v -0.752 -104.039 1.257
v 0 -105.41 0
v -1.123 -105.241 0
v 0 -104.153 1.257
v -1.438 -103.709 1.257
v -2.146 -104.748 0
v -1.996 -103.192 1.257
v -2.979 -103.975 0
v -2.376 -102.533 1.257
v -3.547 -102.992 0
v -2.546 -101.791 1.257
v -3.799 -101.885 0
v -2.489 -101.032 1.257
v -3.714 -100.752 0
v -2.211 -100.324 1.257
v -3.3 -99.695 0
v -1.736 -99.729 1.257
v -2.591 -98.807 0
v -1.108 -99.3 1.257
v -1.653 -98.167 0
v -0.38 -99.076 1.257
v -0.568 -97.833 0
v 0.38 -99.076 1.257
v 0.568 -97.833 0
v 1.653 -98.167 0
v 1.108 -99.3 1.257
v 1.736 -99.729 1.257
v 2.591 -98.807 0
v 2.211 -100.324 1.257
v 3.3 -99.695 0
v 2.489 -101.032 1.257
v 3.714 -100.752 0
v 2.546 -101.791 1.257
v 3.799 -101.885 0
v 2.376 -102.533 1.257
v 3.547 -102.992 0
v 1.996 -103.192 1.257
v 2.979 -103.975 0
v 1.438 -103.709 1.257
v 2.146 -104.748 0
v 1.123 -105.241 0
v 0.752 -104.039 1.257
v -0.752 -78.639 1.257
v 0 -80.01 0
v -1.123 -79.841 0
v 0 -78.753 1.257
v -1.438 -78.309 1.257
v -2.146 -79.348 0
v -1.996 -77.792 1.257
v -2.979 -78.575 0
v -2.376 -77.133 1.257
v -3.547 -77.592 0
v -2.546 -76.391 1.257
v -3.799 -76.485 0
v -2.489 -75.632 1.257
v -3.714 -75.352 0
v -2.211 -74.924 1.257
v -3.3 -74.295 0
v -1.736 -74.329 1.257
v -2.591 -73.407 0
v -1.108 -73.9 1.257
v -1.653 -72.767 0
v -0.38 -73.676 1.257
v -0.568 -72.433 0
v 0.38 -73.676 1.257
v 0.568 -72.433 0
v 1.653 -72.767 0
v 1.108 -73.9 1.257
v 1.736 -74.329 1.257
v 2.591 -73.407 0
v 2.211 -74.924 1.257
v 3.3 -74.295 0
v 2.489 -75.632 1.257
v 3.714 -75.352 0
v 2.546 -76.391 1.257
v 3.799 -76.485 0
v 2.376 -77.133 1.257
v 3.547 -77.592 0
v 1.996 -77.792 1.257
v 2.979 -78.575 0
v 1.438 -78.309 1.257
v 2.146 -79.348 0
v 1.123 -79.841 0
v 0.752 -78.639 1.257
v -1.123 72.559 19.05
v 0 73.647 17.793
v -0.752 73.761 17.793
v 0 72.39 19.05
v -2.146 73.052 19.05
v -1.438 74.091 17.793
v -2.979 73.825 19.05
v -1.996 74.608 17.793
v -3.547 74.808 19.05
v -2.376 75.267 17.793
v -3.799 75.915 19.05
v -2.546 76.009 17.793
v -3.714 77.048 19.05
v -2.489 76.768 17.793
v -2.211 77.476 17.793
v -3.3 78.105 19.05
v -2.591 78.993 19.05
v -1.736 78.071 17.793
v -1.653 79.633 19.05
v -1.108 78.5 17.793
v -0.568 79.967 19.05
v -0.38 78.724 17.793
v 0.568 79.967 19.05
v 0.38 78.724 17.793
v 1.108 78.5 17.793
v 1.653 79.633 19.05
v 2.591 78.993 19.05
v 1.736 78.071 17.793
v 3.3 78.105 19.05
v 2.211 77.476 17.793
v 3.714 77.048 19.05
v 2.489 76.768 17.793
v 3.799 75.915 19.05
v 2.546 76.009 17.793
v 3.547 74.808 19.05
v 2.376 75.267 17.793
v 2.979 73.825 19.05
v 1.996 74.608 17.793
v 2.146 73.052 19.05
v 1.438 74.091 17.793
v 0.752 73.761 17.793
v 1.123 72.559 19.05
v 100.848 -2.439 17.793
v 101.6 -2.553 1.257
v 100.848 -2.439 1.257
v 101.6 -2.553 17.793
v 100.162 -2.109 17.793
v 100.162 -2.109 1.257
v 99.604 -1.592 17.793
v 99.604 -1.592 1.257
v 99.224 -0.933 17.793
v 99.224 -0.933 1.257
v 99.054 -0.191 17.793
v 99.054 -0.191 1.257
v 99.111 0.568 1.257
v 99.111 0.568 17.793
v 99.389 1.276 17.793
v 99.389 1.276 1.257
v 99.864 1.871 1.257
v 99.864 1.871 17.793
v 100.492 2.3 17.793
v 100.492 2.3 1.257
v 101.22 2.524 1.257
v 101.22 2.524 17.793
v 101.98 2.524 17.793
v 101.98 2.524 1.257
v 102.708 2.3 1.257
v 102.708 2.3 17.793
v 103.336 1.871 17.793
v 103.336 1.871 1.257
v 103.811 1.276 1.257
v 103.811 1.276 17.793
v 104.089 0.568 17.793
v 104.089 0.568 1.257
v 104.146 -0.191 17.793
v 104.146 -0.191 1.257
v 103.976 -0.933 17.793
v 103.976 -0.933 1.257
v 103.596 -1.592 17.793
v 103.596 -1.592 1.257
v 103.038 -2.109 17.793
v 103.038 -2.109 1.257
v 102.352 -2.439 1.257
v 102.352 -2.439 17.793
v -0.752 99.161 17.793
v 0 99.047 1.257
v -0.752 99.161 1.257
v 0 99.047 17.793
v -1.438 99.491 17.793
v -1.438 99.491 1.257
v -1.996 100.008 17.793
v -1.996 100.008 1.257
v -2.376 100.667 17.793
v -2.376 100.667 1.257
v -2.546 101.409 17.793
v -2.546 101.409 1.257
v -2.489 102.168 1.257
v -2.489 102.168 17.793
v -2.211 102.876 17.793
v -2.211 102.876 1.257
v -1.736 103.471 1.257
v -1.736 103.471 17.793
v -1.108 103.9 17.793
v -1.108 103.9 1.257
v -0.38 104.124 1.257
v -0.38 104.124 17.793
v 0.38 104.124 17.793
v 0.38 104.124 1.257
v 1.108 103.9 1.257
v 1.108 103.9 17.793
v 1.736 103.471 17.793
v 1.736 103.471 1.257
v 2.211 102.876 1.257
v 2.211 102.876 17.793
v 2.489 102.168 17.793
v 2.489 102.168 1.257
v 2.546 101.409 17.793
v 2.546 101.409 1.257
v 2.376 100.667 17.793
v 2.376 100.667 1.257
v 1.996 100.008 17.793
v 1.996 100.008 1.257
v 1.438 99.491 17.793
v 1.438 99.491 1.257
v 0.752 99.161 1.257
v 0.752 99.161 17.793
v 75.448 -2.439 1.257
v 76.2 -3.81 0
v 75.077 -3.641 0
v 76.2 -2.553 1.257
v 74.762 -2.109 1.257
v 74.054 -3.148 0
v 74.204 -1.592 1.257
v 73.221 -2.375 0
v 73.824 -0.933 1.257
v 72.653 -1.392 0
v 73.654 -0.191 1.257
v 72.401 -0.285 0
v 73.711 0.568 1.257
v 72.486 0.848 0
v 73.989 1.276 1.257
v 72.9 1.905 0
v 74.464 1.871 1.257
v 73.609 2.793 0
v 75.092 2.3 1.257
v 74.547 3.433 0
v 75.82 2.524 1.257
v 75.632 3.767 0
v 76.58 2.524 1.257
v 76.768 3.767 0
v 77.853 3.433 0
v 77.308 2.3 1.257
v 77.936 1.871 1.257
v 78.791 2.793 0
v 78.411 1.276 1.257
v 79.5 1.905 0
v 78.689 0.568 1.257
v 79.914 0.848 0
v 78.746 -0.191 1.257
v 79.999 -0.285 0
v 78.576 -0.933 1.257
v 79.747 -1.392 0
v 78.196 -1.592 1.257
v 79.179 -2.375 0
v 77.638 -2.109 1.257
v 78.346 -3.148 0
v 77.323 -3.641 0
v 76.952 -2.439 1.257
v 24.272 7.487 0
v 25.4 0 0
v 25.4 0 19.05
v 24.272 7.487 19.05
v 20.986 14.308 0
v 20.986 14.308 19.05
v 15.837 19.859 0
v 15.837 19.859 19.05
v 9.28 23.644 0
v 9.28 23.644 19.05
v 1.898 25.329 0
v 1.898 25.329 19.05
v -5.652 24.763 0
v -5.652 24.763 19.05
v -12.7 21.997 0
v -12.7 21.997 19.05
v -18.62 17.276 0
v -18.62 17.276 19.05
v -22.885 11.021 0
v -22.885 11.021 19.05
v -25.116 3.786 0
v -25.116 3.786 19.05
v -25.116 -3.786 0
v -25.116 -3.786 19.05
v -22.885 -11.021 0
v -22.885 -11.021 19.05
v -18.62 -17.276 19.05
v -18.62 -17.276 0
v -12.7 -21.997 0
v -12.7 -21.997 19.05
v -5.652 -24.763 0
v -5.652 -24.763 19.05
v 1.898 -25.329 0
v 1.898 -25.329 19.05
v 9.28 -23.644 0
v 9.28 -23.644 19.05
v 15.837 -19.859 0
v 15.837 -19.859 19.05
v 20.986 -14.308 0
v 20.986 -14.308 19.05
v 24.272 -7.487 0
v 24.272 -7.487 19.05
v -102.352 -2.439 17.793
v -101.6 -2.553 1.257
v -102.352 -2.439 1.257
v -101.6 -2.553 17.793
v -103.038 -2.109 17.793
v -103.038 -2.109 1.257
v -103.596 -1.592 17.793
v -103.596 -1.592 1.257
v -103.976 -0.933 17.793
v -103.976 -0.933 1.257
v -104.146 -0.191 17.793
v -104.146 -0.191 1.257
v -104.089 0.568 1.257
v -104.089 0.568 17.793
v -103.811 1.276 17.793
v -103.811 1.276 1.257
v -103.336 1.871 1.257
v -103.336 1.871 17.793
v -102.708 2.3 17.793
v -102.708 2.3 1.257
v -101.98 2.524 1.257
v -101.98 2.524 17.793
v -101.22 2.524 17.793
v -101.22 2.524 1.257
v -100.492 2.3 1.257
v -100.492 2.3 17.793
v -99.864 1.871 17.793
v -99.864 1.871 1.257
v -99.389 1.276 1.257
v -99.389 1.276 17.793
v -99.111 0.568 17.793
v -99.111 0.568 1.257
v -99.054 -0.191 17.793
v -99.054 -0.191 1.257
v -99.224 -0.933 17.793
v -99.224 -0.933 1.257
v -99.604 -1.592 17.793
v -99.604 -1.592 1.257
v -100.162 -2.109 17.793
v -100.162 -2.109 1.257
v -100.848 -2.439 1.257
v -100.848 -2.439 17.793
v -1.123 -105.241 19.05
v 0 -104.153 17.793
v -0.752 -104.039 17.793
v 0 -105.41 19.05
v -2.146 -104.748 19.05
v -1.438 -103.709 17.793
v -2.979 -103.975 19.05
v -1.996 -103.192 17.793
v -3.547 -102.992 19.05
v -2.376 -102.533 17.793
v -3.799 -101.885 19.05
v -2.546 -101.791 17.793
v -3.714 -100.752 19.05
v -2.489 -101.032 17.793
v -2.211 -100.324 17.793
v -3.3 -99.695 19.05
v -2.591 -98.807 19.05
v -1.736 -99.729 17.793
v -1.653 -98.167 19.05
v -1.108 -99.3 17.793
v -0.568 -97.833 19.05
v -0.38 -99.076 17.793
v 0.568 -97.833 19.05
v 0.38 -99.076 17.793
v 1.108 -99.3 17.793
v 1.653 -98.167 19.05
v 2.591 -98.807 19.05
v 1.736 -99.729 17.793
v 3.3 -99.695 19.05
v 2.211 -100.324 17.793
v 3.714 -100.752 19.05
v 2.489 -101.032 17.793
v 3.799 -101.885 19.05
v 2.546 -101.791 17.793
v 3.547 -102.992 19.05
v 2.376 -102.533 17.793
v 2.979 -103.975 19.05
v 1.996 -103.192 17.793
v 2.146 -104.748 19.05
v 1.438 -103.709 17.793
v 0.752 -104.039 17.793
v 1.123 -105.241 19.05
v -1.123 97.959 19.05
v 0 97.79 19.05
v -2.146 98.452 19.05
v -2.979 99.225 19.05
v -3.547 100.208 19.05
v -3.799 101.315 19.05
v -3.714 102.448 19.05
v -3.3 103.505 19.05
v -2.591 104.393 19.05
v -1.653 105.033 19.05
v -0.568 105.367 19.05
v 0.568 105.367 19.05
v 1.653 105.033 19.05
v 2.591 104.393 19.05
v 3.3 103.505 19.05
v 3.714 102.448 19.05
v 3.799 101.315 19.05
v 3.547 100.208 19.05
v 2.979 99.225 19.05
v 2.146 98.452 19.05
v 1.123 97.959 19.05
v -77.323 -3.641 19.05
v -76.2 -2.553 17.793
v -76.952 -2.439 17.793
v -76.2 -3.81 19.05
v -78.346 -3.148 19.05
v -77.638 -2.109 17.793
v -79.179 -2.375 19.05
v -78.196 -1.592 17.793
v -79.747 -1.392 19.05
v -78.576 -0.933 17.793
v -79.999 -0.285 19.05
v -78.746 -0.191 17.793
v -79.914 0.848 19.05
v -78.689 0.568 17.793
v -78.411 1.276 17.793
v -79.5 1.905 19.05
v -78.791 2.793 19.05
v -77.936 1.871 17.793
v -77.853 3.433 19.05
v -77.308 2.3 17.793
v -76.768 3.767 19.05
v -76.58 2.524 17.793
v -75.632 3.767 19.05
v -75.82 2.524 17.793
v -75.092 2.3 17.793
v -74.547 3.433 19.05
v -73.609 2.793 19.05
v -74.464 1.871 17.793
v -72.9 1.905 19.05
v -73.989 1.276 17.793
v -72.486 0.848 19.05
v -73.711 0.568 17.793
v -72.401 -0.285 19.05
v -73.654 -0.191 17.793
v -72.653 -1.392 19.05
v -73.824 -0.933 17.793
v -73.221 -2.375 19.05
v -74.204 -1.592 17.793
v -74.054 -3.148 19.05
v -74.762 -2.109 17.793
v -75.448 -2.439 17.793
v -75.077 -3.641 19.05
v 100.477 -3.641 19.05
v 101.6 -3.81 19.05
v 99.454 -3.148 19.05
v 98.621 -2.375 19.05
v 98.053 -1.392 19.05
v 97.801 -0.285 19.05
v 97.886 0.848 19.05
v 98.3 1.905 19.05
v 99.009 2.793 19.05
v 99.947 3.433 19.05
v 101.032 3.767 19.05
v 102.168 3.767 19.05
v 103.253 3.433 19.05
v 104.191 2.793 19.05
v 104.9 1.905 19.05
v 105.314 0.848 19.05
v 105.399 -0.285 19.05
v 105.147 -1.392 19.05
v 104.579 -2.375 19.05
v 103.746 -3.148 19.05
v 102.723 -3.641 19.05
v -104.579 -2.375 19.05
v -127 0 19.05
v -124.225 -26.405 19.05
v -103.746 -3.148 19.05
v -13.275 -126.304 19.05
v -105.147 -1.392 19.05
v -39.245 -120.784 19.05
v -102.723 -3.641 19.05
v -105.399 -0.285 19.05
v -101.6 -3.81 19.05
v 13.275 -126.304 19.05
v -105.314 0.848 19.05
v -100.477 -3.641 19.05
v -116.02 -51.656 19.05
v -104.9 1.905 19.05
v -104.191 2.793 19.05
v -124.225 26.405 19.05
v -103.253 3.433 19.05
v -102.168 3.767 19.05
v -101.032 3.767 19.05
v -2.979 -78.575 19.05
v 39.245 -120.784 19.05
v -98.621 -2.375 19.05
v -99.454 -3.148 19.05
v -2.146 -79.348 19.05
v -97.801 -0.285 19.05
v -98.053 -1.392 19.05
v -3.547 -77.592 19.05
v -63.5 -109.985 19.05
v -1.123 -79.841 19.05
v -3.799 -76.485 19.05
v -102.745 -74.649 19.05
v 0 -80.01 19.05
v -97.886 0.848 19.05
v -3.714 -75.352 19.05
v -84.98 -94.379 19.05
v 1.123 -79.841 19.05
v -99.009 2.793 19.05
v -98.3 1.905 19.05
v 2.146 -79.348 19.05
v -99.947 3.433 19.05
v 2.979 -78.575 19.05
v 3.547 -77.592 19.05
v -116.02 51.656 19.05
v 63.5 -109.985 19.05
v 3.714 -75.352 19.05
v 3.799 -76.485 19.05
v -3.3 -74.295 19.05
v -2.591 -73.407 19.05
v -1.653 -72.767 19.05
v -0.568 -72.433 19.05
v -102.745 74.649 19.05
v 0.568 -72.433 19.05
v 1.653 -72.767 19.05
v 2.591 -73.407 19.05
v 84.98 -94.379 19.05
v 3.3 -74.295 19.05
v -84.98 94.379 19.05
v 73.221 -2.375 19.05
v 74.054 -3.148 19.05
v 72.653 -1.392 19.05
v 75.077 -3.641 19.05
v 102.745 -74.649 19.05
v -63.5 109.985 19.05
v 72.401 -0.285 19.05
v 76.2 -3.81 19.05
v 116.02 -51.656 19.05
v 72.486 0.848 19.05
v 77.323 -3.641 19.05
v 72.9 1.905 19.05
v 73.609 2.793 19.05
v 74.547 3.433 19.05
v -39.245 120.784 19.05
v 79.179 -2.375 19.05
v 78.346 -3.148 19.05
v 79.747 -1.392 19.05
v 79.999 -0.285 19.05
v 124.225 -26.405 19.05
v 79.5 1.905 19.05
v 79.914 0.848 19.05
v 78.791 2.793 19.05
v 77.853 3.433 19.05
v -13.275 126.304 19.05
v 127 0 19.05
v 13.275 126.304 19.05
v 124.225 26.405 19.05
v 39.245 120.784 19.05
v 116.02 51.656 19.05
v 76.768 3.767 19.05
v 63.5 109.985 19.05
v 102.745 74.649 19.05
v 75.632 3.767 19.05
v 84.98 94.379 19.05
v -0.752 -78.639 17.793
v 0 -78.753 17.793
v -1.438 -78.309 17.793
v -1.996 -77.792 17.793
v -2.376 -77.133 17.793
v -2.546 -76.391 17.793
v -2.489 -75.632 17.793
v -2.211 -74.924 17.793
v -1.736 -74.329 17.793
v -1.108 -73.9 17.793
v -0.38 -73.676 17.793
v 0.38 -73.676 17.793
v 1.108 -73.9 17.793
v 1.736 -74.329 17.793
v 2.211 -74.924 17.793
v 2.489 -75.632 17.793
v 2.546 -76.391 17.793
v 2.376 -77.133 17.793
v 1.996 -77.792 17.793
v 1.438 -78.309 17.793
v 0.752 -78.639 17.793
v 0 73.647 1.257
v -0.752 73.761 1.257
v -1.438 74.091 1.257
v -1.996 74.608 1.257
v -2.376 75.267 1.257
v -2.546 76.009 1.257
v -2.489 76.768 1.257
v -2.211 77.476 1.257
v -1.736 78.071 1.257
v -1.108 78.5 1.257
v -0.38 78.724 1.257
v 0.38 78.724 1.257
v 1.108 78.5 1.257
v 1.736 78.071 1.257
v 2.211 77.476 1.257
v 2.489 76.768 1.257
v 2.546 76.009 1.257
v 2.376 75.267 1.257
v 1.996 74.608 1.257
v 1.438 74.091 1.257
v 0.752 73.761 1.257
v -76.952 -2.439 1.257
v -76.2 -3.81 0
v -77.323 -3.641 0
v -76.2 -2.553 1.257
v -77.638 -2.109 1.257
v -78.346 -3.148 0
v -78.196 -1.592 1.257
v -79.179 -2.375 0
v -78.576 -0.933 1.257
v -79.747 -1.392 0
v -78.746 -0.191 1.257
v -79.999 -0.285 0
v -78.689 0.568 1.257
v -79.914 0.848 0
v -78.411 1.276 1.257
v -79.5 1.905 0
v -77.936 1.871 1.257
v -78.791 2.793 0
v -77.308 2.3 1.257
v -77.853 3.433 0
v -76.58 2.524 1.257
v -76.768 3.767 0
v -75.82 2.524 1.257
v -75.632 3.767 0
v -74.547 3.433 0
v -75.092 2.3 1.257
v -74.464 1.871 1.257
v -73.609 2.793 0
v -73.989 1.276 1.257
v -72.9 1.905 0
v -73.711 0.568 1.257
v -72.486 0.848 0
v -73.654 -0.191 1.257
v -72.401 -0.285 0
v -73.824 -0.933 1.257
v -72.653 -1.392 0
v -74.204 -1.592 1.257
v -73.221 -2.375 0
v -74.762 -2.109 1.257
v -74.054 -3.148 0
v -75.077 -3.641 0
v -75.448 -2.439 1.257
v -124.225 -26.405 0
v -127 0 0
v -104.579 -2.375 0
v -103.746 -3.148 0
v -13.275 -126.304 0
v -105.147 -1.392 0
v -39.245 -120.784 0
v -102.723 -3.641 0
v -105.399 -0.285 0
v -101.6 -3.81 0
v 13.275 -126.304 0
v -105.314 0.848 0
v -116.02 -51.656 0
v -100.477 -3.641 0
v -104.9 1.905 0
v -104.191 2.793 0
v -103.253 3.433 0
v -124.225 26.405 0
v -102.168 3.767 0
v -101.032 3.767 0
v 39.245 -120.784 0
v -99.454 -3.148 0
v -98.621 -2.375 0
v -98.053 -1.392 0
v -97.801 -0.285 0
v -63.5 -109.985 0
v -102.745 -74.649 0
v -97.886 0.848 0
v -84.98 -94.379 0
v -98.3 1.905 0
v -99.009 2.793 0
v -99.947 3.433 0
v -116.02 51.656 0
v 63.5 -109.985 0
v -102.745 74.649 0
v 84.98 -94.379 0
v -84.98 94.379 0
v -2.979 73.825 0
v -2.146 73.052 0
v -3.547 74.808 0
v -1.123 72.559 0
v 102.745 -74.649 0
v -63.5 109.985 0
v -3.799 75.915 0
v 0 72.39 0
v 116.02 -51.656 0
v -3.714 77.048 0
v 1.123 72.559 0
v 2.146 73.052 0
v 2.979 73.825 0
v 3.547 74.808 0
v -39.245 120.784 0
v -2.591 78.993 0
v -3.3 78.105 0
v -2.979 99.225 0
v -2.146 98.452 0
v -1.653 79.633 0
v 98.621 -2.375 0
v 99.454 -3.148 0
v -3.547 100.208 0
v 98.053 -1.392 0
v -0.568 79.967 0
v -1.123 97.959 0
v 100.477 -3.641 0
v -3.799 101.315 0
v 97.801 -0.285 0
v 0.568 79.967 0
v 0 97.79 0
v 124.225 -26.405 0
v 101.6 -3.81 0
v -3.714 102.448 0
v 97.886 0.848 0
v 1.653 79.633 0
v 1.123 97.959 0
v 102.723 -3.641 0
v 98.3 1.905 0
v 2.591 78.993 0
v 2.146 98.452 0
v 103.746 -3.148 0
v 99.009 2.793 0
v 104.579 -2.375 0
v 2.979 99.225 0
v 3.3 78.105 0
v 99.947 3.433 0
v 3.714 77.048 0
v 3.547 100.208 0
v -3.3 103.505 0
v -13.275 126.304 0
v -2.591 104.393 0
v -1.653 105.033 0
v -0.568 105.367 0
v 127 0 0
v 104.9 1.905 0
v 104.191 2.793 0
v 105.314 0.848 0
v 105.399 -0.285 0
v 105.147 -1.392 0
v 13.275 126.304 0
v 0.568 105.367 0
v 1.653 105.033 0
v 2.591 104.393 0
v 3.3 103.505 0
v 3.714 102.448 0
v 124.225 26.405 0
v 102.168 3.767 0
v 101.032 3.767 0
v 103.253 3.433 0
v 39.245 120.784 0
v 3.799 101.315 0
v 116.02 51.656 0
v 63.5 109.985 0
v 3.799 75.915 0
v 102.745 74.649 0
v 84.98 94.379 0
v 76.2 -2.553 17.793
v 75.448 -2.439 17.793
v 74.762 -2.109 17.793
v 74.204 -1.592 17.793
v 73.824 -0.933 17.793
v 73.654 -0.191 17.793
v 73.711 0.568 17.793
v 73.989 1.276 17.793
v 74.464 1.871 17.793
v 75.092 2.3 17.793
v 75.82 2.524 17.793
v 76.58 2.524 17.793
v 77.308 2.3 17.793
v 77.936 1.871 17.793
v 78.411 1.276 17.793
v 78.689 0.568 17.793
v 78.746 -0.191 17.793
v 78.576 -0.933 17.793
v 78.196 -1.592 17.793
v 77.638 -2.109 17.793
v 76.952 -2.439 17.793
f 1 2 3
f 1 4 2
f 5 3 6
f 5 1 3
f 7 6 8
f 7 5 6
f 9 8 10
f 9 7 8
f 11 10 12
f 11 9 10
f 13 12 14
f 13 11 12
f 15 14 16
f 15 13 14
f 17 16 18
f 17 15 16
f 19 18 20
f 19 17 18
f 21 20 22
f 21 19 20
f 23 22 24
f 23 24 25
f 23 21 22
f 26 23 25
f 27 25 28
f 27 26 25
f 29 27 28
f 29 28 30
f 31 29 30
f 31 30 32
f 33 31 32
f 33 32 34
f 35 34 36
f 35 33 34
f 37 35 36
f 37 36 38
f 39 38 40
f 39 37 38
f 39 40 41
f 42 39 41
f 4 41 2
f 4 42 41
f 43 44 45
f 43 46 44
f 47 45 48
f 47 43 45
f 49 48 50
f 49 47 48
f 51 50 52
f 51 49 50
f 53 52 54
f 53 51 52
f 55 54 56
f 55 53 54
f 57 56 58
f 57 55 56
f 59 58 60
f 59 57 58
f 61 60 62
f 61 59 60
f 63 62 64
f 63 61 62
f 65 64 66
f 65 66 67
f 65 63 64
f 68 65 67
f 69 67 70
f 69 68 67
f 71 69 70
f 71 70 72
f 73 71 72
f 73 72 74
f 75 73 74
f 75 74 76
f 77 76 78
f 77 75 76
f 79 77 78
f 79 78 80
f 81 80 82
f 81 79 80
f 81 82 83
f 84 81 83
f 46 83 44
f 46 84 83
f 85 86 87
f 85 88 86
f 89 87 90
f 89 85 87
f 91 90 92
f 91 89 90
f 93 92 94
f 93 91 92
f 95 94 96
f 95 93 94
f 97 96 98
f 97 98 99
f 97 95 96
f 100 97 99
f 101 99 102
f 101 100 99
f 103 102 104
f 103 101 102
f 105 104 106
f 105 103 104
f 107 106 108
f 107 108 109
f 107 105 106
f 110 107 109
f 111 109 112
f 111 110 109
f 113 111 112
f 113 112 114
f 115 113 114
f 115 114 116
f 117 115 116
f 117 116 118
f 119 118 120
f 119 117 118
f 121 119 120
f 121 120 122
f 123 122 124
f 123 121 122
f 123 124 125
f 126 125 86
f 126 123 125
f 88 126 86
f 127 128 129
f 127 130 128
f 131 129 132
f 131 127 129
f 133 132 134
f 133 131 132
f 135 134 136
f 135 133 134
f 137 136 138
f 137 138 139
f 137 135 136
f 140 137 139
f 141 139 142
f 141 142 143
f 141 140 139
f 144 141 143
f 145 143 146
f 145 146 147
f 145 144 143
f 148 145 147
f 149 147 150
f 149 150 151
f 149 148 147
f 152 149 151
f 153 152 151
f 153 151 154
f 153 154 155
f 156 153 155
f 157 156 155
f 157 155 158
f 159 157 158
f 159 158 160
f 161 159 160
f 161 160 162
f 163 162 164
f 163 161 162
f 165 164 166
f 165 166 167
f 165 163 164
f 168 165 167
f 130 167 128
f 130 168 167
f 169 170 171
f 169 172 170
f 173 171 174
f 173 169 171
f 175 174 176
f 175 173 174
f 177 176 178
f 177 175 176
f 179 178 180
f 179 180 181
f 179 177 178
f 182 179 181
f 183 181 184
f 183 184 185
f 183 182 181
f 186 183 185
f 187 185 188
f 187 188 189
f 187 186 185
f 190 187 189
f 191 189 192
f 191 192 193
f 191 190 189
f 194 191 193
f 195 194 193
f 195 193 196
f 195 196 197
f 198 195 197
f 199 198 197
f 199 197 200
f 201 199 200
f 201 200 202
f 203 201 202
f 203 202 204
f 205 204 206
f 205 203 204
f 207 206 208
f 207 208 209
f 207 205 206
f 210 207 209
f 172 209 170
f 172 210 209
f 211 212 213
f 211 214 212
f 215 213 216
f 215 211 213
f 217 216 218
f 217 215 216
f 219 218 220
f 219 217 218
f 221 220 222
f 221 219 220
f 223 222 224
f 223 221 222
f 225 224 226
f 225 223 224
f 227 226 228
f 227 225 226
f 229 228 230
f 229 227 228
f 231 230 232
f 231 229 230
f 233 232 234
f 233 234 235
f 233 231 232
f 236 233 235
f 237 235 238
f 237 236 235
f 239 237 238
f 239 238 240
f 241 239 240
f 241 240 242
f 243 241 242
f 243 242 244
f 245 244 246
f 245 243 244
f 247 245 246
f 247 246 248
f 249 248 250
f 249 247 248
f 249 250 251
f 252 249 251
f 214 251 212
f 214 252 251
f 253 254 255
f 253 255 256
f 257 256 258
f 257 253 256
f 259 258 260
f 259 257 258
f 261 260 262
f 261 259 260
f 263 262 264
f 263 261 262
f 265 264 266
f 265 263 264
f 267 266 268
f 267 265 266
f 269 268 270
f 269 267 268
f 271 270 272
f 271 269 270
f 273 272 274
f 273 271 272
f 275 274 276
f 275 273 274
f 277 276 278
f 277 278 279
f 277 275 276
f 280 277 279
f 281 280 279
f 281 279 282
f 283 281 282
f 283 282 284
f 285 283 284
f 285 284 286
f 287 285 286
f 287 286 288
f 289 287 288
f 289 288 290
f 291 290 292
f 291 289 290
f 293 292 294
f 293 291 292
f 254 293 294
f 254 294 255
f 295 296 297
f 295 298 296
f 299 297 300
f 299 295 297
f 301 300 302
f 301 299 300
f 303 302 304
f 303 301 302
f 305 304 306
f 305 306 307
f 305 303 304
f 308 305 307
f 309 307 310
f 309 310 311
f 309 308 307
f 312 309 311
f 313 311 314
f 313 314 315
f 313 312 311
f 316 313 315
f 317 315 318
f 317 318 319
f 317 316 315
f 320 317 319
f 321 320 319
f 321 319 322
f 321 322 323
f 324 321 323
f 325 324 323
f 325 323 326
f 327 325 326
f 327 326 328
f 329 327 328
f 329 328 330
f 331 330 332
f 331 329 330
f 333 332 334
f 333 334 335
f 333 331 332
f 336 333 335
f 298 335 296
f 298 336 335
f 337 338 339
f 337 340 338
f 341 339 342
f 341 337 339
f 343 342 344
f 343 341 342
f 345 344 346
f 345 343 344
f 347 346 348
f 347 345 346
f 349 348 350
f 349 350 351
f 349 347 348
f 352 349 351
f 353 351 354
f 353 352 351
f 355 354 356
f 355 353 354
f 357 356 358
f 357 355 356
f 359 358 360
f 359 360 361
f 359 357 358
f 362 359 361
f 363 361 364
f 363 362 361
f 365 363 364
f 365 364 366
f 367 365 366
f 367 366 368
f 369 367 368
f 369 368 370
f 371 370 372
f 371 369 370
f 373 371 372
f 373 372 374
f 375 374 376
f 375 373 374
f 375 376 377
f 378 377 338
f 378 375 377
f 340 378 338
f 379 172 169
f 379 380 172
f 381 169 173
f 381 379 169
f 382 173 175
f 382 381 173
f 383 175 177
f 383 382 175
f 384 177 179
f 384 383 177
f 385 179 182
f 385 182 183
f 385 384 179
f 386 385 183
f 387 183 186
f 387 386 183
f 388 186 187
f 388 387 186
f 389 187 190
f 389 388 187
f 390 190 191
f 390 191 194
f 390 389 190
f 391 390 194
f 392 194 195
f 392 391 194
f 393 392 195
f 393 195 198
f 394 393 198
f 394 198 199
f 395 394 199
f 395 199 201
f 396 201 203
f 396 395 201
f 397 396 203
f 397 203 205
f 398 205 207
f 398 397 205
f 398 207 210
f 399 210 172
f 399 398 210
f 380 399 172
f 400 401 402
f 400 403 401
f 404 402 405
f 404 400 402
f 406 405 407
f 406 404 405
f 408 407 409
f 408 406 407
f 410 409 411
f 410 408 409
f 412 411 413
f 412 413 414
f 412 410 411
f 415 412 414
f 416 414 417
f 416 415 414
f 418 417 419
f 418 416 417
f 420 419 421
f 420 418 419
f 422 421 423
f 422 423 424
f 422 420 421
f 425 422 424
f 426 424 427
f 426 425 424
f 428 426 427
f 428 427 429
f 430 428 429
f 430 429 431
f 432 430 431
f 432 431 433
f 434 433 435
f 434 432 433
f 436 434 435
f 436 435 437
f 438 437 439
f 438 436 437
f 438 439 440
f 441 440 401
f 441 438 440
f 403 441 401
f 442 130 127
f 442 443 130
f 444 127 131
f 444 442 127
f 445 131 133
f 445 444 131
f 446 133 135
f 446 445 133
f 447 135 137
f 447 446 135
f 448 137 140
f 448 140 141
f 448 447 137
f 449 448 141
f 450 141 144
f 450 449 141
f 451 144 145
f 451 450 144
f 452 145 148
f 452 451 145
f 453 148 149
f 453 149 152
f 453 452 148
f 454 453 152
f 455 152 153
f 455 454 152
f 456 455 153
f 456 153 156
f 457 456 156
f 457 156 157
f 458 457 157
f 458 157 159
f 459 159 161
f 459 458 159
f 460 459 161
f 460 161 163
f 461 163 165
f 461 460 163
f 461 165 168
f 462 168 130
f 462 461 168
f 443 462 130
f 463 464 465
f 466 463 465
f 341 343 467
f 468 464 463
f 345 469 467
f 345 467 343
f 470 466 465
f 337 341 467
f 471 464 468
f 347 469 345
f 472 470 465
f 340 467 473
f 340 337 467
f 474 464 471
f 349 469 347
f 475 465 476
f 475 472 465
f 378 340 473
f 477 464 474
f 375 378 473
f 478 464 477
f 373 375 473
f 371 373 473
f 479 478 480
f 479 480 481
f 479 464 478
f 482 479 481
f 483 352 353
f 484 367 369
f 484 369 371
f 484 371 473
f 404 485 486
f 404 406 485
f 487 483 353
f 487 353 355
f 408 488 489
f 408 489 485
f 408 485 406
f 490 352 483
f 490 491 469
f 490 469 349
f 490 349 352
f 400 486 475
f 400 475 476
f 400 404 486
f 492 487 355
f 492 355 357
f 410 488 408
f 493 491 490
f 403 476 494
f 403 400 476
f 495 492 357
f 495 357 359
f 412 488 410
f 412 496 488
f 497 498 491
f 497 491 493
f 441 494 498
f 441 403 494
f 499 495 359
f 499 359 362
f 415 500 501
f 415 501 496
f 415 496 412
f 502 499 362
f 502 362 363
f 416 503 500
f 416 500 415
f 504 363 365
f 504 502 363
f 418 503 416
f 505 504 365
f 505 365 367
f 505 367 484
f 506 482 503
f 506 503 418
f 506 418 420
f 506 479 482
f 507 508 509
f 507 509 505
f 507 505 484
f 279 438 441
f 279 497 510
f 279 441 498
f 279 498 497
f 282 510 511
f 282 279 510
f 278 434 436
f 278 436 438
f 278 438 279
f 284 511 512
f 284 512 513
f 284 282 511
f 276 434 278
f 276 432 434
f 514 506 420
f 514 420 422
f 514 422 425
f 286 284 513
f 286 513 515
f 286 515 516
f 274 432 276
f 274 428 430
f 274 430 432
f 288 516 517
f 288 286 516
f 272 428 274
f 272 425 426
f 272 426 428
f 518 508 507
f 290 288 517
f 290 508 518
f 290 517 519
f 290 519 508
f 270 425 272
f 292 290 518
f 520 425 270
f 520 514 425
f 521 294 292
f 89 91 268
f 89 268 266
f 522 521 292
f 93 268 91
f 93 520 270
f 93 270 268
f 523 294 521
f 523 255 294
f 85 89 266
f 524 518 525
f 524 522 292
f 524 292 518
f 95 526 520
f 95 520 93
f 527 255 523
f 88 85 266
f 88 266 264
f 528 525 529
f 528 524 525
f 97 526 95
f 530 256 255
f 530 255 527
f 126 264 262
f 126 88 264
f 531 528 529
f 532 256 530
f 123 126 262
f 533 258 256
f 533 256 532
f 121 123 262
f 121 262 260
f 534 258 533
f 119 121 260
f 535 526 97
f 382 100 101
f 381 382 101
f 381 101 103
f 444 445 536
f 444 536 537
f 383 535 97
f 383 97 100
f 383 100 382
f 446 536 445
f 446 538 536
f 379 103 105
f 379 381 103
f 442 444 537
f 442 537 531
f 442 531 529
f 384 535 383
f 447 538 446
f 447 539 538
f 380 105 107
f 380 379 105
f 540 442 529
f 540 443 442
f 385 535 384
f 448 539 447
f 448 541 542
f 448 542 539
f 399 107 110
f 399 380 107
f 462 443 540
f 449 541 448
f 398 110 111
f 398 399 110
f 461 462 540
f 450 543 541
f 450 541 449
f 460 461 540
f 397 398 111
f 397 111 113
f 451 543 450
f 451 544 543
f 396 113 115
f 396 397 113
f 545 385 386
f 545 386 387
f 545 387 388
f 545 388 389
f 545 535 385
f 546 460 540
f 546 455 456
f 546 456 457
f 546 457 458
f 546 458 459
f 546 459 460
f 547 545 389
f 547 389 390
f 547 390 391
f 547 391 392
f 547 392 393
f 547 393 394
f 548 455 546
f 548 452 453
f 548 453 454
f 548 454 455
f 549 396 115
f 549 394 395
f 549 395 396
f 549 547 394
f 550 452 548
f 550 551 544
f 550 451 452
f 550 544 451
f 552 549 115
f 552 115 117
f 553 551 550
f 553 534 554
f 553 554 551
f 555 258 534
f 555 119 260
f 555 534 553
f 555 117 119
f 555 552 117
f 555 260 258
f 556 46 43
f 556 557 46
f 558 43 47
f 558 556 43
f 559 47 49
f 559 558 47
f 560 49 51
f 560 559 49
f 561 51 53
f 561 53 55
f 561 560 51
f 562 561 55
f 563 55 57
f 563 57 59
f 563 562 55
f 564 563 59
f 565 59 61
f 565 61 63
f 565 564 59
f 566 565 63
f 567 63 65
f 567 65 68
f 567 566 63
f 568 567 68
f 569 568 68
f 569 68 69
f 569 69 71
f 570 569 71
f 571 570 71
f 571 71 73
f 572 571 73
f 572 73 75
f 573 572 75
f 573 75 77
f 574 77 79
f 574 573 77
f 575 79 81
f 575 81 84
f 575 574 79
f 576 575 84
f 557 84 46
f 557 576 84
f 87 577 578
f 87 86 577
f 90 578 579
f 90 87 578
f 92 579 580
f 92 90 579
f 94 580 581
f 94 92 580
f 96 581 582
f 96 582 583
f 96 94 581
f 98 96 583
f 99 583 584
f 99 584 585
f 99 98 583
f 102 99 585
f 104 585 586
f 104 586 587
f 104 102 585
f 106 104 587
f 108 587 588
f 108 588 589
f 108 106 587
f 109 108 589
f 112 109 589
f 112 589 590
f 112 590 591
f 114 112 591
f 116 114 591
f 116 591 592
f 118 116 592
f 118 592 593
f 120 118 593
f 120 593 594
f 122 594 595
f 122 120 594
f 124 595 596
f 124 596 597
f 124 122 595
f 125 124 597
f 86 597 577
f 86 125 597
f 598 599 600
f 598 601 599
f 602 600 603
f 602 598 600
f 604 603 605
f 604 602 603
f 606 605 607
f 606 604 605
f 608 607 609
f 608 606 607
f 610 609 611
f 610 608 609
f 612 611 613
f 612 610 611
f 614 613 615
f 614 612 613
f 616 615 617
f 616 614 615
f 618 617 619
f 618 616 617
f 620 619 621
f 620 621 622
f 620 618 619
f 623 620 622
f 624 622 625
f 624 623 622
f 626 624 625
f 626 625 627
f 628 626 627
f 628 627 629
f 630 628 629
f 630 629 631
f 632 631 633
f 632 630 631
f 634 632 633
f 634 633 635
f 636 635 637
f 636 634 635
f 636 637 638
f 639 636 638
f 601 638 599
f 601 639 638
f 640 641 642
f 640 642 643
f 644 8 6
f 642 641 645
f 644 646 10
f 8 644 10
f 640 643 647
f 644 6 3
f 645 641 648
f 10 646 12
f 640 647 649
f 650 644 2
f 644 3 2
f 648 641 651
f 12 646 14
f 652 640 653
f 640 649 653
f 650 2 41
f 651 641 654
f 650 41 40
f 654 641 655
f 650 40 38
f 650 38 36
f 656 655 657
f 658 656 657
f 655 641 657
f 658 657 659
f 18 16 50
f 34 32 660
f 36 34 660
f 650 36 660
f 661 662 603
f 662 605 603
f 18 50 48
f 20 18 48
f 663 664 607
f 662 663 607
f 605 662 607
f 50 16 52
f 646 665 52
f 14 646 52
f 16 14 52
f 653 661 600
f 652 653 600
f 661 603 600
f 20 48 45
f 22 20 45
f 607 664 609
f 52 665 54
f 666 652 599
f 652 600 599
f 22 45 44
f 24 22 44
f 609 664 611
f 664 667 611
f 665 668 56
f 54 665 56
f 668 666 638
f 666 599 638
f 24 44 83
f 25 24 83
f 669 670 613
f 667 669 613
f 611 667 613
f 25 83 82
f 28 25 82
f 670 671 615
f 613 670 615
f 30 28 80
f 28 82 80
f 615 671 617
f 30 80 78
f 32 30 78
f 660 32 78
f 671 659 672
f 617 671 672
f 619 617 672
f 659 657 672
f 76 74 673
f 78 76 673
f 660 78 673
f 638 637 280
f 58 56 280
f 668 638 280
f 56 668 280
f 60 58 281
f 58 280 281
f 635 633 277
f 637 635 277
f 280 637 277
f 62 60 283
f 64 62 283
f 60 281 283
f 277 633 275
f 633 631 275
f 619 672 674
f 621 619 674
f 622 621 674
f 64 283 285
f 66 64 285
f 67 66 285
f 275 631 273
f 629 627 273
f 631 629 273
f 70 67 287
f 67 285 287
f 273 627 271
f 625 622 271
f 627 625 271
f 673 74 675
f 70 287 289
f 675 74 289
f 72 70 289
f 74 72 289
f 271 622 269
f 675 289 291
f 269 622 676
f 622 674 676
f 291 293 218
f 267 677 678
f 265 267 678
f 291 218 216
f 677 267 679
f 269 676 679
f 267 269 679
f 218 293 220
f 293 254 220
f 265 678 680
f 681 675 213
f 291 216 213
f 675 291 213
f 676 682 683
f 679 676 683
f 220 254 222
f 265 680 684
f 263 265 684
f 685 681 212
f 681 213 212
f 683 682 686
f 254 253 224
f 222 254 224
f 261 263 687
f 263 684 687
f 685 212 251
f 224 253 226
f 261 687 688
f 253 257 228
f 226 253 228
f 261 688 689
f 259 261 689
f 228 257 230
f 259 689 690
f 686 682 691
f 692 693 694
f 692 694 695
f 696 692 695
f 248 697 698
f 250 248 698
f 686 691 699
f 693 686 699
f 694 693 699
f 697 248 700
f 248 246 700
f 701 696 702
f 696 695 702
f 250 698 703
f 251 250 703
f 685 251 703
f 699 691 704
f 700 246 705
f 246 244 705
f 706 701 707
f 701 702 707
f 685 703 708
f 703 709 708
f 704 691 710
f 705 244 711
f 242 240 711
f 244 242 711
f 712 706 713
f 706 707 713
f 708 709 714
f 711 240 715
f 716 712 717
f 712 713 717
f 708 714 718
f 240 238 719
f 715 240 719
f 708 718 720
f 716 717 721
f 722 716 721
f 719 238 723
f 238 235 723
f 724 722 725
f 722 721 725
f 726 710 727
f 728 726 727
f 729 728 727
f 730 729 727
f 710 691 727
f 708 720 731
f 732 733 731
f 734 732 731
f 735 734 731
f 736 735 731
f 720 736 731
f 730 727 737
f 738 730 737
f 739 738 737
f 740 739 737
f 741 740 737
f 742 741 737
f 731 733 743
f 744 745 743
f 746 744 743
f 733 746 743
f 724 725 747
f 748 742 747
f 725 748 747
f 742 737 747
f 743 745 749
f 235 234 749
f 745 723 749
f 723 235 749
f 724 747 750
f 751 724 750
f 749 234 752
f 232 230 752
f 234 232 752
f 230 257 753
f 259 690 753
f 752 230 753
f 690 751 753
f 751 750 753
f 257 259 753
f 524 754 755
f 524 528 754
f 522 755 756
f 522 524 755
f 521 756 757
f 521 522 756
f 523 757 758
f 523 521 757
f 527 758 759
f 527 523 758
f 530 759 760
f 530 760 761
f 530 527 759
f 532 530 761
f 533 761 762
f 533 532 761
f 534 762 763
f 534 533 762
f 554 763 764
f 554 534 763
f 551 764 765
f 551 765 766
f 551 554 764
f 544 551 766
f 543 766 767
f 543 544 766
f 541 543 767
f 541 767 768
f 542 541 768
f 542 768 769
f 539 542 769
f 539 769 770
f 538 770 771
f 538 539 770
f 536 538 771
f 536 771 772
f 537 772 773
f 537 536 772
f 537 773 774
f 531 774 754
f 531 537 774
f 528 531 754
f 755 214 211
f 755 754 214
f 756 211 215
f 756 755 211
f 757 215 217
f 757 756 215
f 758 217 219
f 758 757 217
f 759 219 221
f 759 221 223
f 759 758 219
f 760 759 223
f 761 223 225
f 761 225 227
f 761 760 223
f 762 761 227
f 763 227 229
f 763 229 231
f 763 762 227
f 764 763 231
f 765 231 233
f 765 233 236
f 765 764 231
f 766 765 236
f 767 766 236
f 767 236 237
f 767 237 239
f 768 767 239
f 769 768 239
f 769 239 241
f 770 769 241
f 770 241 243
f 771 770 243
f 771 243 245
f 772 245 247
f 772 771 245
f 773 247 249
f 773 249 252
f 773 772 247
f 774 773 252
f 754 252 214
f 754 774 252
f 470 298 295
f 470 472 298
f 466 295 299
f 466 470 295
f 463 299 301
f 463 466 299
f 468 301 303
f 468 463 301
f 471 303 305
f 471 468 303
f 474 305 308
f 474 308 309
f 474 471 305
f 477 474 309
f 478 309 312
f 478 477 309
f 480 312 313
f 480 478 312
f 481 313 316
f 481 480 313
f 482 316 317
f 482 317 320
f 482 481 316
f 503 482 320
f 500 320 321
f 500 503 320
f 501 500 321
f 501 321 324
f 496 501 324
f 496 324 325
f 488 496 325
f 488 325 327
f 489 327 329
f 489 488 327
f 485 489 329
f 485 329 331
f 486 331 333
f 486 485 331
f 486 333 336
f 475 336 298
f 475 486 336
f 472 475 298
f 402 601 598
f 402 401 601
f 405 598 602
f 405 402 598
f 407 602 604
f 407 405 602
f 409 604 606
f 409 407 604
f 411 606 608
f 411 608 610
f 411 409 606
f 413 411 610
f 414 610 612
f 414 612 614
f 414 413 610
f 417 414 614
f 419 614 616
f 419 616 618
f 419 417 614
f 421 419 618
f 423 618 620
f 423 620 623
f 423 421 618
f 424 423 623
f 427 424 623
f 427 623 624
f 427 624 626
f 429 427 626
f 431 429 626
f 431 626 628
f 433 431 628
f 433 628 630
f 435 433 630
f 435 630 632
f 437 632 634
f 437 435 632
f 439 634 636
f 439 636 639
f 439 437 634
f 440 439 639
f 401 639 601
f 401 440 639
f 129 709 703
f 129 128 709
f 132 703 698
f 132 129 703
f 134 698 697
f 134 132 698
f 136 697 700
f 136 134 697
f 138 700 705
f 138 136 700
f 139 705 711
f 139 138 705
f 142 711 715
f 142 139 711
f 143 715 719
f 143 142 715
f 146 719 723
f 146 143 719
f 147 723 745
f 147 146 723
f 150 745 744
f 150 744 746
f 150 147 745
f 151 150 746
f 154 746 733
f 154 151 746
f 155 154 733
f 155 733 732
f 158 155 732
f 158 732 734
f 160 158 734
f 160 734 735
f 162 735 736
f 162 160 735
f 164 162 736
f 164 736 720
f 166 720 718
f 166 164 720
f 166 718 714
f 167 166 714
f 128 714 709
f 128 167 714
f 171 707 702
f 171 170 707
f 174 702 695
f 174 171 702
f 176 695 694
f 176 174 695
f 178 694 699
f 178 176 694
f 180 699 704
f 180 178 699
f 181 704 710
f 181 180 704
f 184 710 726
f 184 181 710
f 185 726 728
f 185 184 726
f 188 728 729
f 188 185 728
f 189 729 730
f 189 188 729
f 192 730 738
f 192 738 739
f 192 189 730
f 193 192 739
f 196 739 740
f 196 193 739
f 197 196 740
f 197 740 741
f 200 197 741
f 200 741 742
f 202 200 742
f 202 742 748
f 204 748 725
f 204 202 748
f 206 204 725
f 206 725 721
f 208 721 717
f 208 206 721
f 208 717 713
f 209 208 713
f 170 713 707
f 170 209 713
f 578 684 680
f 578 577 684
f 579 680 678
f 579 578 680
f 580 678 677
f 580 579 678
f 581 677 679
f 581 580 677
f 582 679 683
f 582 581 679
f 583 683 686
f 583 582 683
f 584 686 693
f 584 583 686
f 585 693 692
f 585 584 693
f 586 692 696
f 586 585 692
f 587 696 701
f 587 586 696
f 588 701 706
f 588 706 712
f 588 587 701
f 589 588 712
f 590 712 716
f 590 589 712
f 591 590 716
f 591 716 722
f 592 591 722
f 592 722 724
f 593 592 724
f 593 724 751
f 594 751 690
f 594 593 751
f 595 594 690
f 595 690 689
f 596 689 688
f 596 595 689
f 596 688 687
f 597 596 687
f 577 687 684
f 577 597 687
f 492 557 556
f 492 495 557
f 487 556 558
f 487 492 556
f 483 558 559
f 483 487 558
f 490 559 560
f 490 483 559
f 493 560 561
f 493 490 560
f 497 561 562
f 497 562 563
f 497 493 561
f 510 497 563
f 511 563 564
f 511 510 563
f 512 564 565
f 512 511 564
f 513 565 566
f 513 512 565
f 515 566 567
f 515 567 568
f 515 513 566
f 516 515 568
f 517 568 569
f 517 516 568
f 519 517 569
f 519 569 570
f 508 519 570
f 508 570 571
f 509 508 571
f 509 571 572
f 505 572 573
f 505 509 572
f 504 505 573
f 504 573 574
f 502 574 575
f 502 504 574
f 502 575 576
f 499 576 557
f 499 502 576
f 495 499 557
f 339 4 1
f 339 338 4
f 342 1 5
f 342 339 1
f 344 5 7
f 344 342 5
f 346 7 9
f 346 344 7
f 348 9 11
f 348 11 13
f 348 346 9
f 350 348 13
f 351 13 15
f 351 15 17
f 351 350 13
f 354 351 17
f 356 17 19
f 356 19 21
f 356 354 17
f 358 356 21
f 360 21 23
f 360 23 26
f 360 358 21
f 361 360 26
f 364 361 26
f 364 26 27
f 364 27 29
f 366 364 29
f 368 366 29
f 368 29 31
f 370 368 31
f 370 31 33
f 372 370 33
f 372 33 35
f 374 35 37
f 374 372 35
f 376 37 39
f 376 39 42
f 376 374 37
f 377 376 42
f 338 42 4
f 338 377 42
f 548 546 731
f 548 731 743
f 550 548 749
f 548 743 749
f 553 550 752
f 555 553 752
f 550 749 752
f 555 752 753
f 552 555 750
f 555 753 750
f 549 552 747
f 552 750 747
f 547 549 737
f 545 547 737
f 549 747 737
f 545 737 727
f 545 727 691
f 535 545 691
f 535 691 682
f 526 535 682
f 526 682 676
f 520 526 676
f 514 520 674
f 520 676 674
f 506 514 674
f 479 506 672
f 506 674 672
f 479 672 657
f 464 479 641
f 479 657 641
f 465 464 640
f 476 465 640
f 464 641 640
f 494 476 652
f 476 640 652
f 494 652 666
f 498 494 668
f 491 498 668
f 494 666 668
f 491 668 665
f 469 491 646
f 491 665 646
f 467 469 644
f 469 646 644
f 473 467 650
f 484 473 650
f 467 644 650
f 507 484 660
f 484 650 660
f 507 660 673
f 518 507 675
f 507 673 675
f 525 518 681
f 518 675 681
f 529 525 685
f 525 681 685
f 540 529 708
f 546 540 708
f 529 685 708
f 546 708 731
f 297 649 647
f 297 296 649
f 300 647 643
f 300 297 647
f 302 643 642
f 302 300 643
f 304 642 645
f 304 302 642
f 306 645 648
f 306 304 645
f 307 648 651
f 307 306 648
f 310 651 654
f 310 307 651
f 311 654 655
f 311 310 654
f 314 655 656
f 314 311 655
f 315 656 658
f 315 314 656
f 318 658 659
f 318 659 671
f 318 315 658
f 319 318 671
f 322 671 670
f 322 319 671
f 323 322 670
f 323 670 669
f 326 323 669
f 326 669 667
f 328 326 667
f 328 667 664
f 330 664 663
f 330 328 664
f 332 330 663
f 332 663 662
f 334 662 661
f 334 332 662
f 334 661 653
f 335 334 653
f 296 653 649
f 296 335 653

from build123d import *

# Parameters (mm, degrees)
SKETCH1_R                        = 127
SKETCH1_R_2                      = 25.4
BOSS_EXTRUDE2_DEPTH              = 19.05
F_1_4_20_TAPPED_HOLE1_AT_2_COUNT = 2
F_1_4_20_TAPPED_HOLE1_AT_2_PITCH = 127
F_1_4_20_TAPPED_HOLE1_AT_3_COUNT = 2
F_1_4_20_TAPPED_HOLE1_AT_3_PITCH = 107.763073453
F_1_4_20_TAPPED_HOLE1_AT_4_COUNT = 2
F_1_4_20_TAPPED_HOLE1_AT_4_PITCH = 177.8
F_1_4_20_TAPPED_HOLE1_AT_5_COUNT = 2
F_1_4_20_TAPPED_HOLE1_AT_5_PITCH = 152.4
F_1_4_20_TAPPED_HOLE1_AT_6_COUNT = 2
F_1_4_20_TAPPED_HOLE1_AT_6_PITCH = 127
F_1_4_20_TAPPED_HOLE1_AT_7_COUNT = 2
F_1_4_20_TAPPED_HOLE1_AT_7_PITCH = 107.763073453
F_1_4_20_TAPPED_HOLE1_AT_8_COUNT = 2
F_1_4_20_TAPPED_HOLE1_AT_8_PITCH = 25.4


with BuildPart() as part:
    # Sketch1 → Boss-Extrude2 (new body)
    with BuildSketch(Plane.XY):
        Circle(SKETCH1_R)
        Circle(SKETCH1_R_2, mode=Mode.SUBTRACT)
    extrude(amount=BOSS_EXTRUDE2_DEPTH)

    # Sketch5 → 1/4-20 Tapped Hole1 (revolve, cut)
    with BuildSketch(Plane(origin=(-76.2, 0, 19.05), x_dir=(0, -1, 0), z_dir=(1, 0, 0))):
        Polygon((0, 0), (0, 19.05), (3.81, 19.05), (2.5527, 17.7927), (2.5527, 1.2573), (3.81, 0), align=None)
    f_1_4_20_tapped_hole1 = revolve(axis=Axis((-76.2, 0, 25.4), (0, 0, -1)), mode=Mode.SUBTRACT)

    # 1/4-20 Tapped Hole1 at 2: 1/4-20 Tapped Hole1 ×2
    with Locations(*[Vector(0.6, 0.8, 0) * (i * F_1_4_20_TAPPED_HOLE1_AT_2_PITCH) for i in range(1, F_1_4_20_TAPPED_HOLE1_AT_2_COUNT)]):
        add(f_1_4_20_tapped_hole1, mode=Mode.SUBTRACT)

    # 1/4-20 Tapped Hole1 at 3: 1/4-20 Tapped Hole1 ×2
    with Locations(*[Vector(0.707106781, 0.707106781, 0) * (i * F_1_4_20_TAPPED_HOLE1_AT_3_PITCH) for i in range(1, F_1_4_20_TAPPED_HOLE1_AT_3_COUNT)]):
        add(f_1_4_20_tapped_hole1, mode=Mode.SUBTRACT)

    # 1/4-20 Tapped Hole1 at 4: 1/4-20 Tapped Hole1 ×2
    with Locations(*[(i * F_1_4_20_TAPPED_HOLE1_AT_4_PITCH, 0, 0) for i in range(1, F_1_4_20_TAPPED_HOLE1_AT_4_COUNT)]):
        add(f_1_4_20_tapped_hole1, mode=Mode.SUBTRACT)

    # 1/4-20 Tapped Hole1 at 5: 1/4-20 Tapped Hole1 ×2
    with Locations(*[(i * F_1_4_20_TAPPED_HOLE1_AT_5_PITCH, 0, 0) for i in range(1, F_1_4_20_TAPPED_HOLE1_AT_5_COUNT)]):
        add(f_1_4_20_tapped_hole1, mode=Mode.SUBTRACT)

    # 1/4-20 Tapped Hole1 at 6: 1/4-20 Tapped Hole1 ×2
    with Locations(*[Vector(0.6, -0.8, 0) * (i * F_1_4_20_TAPPED_HOLE1_AT_6_PITCH) for i in range(1, F_1_4_20_TAPPED_HOLE1_AT_6_COUNT)]):
        add(f_1_4_20_tapped_hole1, mode=Mode.SUBTRACT)

    # 1/4-20 Tapped Hole1 at 7: 1/4-20 Tapped Hole1 ×2
    with Locations(*[Vector(0.707106781, -0.707106781, 0) * (i * F_1_4_20_TAPPED_HOLE1_AT_7_PITCH) for i in range(1, F_1_4_20_TAPPED_HOLE1_AT_7_COUNT)]):
        add(f_1_4_20_tapped_hole1, mode=Mode.SUBTRACT)

    # 1/4-20 Tapped Hole1 at 8: 1/4-20 Tapped Hole1 ×2
    with Locations(*[(-i * F_1_4_20_TAPPED_HOLE1_AT_8_PITCH, 0, 0) for i in range(1, F_1_4_20_TAPPED_HOLE1_AT_8_COUNT)]):
        add(f_1_4_20_tapped_hole1, mode=Mode.SUBTRACT)


solid = part.part
